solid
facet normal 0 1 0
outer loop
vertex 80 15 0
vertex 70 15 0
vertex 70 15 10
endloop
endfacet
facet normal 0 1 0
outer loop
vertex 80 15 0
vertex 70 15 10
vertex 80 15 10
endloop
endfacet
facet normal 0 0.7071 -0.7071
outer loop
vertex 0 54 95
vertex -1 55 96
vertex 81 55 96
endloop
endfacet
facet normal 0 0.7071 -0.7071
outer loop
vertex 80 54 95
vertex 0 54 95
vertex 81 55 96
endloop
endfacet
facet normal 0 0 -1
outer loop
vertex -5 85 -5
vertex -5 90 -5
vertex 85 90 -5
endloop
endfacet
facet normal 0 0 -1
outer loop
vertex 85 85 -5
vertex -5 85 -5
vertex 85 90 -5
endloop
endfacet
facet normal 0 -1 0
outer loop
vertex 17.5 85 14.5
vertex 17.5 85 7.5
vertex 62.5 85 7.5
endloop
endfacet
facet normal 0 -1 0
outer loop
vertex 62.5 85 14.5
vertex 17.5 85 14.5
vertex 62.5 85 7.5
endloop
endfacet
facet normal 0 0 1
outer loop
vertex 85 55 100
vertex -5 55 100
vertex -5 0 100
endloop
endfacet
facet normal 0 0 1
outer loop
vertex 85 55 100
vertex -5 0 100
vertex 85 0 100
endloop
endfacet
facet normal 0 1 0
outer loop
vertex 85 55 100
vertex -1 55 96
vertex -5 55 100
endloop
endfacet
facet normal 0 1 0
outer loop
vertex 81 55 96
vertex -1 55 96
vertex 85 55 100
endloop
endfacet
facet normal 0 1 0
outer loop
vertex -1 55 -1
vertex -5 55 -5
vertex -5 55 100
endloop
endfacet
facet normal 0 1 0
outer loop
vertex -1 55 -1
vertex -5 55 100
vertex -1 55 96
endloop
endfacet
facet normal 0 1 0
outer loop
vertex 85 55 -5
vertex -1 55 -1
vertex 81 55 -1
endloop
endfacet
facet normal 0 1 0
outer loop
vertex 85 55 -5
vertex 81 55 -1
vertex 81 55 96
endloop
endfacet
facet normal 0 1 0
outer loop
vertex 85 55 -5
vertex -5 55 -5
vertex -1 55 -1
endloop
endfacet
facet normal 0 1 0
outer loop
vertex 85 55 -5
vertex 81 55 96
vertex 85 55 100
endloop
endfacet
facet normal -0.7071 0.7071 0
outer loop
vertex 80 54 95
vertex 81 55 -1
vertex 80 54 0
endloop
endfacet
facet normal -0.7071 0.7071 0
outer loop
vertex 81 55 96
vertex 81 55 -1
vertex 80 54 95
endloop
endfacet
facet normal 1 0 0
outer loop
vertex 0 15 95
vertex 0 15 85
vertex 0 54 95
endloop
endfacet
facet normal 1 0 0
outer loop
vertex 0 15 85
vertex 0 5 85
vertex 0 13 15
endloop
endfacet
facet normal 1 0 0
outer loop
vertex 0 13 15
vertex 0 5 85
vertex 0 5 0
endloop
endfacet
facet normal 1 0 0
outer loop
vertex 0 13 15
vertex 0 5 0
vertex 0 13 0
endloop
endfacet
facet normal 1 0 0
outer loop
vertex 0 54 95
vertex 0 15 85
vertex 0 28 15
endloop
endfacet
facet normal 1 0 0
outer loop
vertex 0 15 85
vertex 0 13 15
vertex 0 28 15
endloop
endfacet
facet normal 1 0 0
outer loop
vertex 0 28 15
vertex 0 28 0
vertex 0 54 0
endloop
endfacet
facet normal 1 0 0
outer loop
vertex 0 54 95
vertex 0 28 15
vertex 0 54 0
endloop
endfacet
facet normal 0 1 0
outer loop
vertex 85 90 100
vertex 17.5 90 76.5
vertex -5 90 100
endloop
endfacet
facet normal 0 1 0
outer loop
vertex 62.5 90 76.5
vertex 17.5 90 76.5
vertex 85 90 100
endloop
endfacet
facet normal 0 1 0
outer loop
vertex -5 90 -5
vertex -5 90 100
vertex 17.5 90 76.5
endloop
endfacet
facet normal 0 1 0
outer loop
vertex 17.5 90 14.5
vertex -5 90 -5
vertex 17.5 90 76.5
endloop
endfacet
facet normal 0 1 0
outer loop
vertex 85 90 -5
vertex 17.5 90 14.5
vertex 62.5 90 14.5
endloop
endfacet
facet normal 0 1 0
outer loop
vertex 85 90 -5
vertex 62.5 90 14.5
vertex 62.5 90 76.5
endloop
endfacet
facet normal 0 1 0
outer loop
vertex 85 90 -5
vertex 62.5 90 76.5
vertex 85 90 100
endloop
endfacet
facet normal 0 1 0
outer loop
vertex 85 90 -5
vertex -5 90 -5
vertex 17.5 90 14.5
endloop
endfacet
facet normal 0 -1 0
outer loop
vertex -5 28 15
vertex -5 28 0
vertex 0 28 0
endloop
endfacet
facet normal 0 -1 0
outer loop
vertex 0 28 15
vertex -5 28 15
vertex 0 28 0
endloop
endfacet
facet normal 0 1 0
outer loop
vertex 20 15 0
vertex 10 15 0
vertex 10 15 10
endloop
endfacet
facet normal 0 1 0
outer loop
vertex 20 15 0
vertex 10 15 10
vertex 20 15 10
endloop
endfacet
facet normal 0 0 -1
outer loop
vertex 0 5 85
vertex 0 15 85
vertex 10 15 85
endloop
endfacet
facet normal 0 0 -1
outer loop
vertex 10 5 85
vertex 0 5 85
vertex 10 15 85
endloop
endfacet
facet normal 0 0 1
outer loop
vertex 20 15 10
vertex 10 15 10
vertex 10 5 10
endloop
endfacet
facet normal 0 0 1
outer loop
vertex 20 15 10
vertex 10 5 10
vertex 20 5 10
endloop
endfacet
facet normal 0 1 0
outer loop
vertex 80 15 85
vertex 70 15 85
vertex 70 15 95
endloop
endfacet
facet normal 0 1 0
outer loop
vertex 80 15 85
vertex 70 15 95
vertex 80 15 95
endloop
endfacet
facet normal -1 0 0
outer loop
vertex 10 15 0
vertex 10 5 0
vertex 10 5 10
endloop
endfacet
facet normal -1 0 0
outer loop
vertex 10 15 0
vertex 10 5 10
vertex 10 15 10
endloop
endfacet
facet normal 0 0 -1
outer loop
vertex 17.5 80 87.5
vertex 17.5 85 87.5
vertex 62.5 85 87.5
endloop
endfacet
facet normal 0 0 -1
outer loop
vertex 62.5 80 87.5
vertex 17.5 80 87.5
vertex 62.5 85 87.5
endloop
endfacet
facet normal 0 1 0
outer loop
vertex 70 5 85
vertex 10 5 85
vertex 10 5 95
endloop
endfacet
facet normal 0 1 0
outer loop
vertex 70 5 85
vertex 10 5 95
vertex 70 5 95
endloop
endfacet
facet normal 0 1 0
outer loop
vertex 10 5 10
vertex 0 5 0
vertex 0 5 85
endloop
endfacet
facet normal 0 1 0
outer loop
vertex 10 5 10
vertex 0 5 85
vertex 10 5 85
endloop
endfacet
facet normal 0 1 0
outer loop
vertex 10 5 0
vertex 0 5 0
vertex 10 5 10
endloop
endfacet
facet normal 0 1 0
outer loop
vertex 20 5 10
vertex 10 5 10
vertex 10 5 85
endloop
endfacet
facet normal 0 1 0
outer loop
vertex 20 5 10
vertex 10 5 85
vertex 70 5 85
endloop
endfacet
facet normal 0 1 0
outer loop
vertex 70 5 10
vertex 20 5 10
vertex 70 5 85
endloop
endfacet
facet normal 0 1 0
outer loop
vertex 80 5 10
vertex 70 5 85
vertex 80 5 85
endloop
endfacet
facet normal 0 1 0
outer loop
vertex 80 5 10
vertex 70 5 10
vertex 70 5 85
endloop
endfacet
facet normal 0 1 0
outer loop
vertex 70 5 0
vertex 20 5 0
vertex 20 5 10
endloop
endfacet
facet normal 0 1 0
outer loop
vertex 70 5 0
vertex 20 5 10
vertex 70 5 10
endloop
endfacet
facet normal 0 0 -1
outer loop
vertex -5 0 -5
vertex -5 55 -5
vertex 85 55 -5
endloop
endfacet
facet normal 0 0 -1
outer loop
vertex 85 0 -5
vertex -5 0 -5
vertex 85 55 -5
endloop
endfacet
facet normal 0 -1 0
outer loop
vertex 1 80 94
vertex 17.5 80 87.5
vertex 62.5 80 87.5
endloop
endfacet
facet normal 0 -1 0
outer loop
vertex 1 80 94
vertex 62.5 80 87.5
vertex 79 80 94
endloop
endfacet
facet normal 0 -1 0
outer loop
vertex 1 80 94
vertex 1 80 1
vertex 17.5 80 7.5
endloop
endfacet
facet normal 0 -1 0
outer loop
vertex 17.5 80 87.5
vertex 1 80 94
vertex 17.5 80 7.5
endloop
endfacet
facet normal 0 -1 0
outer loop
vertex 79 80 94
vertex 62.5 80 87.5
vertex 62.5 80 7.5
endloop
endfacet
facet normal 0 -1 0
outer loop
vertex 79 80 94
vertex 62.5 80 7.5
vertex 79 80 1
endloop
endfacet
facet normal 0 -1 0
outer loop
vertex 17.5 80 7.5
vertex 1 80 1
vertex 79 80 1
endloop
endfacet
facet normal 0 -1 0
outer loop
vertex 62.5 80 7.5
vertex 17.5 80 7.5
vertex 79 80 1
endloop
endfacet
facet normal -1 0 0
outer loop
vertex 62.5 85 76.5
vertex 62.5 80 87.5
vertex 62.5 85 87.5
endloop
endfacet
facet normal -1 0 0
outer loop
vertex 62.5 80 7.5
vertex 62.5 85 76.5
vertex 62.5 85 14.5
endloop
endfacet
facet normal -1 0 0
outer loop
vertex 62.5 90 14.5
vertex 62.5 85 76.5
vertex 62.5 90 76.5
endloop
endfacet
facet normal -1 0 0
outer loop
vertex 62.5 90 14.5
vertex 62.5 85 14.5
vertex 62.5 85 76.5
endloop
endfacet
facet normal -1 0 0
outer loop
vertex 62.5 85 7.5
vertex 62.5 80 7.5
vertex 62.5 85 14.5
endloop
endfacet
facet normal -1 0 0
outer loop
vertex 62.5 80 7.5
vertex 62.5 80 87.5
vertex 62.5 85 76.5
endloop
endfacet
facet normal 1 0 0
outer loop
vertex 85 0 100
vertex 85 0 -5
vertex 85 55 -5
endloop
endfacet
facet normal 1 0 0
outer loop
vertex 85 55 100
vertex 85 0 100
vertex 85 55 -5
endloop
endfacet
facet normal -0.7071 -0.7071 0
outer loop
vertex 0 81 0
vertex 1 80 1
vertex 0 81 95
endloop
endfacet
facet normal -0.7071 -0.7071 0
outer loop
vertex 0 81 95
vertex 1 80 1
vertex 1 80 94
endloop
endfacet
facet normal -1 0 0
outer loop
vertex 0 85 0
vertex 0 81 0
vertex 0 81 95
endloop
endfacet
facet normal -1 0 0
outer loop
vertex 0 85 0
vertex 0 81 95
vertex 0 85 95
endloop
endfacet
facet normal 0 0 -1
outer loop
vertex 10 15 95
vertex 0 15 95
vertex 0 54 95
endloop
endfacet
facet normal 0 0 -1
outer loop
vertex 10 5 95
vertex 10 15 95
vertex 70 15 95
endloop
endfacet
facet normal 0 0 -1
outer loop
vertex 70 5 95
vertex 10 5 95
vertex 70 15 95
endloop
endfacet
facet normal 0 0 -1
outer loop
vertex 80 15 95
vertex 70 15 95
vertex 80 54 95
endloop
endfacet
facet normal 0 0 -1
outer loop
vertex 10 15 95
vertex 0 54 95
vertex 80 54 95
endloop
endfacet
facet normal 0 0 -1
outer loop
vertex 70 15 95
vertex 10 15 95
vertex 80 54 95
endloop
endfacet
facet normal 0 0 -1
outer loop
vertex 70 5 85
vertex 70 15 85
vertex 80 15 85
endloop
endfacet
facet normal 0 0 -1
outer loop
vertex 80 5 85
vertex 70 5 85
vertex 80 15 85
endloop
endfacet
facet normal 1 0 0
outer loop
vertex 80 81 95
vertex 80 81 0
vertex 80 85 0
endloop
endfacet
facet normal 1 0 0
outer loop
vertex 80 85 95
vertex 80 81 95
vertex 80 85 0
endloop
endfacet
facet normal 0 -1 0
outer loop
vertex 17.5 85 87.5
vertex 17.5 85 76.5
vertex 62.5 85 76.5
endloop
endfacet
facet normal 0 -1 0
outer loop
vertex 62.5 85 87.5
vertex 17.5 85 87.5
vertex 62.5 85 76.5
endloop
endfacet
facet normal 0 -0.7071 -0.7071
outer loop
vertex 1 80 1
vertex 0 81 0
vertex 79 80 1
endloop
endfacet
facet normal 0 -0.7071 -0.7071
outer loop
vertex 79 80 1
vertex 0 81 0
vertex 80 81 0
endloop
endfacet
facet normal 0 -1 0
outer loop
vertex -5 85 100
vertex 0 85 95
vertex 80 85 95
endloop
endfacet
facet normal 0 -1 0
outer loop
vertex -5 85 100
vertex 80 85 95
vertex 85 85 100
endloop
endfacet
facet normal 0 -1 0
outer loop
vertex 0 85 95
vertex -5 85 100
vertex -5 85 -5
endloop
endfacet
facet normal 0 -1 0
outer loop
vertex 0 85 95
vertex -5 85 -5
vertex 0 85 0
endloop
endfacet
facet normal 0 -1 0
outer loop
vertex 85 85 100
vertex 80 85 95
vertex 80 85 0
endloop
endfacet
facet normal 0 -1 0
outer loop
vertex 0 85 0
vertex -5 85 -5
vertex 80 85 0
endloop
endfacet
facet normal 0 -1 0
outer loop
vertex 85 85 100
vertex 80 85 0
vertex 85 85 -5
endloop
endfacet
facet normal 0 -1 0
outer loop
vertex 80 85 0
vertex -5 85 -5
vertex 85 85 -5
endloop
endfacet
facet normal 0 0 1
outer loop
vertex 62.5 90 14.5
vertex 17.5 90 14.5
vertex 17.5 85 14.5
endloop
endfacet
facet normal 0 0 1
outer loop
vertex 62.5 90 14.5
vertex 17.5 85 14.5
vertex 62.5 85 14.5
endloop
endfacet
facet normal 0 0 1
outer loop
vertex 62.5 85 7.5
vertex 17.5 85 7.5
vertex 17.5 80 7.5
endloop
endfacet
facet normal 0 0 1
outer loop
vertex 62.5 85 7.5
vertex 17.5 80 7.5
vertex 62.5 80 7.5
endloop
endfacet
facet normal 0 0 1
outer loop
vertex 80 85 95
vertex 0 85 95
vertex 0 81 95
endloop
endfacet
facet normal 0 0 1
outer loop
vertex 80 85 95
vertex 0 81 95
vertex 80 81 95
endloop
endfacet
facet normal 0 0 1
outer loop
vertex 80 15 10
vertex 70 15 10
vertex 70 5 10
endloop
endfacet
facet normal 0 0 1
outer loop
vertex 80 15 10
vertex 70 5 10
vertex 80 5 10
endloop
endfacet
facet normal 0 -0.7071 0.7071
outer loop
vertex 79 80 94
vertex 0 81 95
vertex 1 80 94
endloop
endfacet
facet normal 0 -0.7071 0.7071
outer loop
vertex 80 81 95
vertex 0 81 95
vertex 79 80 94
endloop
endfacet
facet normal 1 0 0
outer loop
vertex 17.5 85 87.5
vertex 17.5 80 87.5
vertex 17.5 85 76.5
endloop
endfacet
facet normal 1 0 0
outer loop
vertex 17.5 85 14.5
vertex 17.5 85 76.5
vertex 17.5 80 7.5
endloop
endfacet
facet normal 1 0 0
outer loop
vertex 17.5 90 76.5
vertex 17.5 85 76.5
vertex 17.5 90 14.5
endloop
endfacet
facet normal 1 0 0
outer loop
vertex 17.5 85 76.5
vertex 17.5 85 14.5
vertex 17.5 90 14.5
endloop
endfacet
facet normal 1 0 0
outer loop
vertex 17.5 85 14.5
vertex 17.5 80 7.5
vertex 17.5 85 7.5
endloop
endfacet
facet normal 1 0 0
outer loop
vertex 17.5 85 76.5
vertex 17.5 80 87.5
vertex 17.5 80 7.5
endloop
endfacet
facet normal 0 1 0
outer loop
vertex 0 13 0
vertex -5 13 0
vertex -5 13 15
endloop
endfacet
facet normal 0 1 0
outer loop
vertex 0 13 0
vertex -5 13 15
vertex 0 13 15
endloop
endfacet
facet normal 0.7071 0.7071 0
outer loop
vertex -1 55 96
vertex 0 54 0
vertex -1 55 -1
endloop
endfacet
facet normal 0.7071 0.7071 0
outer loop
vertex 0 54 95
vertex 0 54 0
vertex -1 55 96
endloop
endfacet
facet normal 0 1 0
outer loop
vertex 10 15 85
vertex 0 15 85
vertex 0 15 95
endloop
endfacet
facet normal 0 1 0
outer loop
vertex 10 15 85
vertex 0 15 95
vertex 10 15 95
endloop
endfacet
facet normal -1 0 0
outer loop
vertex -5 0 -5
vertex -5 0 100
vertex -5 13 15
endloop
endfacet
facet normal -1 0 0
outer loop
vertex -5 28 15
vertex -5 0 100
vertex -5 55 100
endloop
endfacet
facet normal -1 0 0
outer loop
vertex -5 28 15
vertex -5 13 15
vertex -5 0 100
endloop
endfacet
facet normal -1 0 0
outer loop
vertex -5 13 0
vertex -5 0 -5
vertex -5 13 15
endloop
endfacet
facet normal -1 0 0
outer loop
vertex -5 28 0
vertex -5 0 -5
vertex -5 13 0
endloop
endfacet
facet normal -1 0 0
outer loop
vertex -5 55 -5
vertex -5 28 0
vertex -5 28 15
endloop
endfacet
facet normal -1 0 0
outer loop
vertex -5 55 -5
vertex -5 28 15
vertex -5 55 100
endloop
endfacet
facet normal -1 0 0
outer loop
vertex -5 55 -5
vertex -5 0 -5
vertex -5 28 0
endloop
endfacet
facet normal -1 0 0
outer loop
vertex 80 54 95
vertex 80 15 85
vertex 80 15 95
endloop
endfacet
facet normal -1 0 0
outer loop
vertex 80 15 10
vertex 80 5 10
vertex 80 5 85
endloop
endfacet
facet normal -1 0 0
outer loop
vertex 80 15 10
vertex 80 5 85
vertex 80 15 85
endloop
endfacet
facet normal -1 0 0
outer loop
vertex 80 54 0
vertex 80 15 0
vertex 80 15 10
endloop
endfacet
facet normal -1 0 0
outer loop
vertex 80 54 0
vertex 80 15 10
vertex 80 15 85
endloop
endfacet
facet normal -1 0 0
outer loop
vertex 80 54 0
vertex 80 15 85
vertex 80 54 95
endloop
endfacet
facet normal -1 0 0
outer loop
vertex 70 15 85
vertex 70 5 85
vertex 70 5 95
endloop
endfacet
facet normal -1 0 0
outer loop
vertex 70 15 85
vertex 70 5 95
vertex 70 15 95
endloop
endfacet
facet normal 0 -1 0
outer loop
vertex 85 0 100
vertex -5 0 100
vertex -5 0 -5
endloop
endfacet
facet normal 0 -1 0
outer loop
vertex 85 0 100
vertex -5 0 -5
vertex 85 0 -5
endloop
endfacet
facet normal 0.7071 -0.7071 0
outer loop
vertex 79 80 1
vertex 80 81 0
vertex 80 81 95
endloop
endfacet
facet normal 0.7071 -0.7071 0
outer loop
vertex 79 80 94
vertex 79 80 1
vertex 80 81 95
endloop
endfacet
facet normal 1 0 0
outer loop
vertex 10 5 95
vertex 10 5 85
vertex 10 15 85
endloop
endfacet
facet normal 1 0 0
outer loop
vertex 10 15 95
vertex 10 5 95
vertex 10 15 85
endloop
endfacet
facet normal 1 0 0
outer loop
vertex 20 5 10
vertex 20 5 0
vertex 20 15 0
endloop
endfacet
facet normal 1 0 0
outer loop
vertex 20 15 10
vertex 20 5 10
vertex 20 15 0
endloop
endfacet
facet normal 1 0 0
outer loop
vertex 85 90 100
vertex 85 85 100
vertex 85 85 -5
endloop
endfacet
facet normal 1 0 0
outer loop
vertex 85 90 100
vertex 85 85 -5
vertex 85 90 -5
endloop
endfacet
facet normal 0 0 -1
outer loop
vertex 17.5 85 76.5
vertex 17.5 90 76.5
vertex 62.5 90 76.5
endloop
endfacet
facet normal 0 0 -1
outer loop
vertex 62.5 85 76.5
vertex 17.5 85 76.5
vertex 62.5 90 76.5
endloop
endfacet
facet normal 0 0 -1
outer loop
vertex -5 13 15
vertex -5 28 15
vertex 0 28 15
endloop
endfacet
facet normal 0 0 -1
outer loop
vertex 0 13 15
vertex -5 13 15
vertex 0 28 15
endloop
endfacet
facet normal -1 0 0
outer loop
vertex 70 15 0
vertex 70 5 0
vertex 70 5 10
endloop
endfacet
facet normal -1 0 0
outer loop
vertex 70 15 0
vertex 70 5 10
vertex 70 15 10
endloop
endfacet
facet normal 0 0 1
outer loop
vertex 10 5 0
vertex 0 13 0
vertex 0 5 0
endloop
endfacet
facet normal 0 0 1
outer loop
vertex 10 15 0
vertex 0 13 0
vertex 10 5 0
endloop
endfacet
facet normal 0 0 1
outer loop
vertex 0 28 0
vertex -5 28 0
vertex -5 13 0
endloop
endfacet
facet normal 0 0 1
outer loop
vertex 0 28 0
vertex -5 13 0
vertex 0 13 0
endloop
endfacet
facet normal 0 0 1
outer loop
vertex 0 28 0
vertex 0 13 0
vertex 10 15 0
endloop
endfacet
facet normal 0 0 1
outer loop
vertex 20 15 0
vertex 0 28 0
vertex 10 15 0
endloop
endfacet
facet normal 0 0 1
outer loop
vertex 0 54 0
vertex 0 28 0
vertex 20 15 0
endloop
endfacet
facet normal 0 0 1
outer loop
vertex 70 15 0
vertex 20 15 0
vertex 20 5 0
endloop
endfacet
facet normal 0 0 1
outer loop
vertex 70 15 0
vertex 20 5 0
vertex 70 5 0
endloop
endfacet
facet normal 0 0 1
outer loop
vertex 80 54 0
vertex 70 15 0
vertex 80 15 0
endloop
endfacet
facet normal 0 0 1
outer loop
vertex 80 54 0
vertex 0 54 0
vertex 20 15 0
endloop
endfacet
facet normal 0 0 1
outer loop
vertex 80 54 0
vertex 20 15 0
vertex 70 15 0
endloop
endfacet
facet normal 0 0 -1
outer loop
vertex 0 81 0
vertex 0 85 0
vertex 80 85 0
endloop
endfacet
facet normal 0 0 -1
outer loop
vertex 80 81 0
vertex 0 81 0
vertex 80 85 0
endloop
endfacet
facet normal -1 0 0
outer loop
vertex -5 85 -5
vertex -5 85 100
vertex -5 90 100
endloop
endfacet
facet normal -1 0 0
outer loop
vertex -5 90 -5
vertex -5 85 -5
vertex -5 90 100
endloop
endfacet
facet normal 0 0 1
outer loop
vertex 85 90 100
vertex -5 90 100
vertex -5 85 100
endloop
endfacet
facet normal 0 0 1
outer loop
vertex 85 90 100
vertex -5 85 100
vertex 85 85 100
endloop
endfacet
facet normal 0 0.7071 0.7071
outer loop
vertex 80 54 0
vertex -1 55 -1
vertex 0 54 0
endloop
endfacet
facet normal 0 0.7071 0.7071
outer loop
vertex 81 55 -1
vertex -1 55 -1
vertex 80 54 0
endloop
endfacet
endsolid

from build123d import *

# Parameters (mm, degrees)
BOX006_W        = 15
BOX006_H        = 15
BOX006_DEPTH    = 15
BOX003_W        = 10
BOX003_H        = 10
BOX003_DEPTH    = 10
BOX004_W        = 10
BOX004_H        = 10
BOX004_DEPTH    = 10
BOX005_W        = 10
BOX005_H        = 10
BOX005_DEPTH    = 10
BOX002_W        = 10
BOX002_H        = 10
BOX002_DEPTH    = 10
BOX_W           = 80
BOX_H           = 50
BOX_DEPTH       = 95
BOX001_W        = 90
BOX001_H        = 55
BOX001_DEPTH    = 105
CHAMFER_SIZE    = 1
BOX009_W        = 45
BOX009_H        = 5
BOX009_DEPTH    = 80
BOX008_W        = 80
BOX008_H        = 5
BOX008_DEPTH    = 95
BOX010_W        = 45
BOX010_H        = 5
BOX010_DEPTH    = 62
BOX007_W        = 90
BOX007_H        = 5
BOX007_DEPTH    = 105
CHAMFER001_SIZE = 1


with BuildPart() as cube006:
    # Box006 → Box006 (new body)
    with BuildSketch(Plane(origin=(-5, 13, 0), x_dir=(1, 0, 0), z_dir=(0, 0, 1))):
        with Locations((7.5, 7.5)):
            Rectangle(BOX006_W, BOX006_H)
    extrude(amount=BOX006_DEPTH)


with BuildPart() as cube003:
    # Box003 → Box003 (new body)
    with BuildSketch(Plane(origin=(70, 5, 0), x_dir=(1, 0, 0), z_dir=(0, 0, 1))):
        with Locations((5, 5)):
            Rectangle(BOX003_W, BOX003_H)
    extrude(amount=BOX003_DEPTH)


with BuildPart() as cube004:
    # Box004 → Box004 (new body)
    with BuildSketch(Plane(origin=(70, 5, 85), x_dir=(1, 0, 0), z_dir=(0, 0, 1))):
        with Locations((5, 5)):
            Rectangle(BOX004_W, BOX004_H)
    extrude(amount=BOX004_DEPTH)


with BuildPart() as cube005:
    # Box005 → Box005 (new body)
    with BuildSketch(Plane(origin=(0, 5, 85), x_dir=(1, 0, 0), z_dir=(0, 0, 1))):
        with Locations((5, 5)):
            Rectangle(BOX005_W, BOX005_H)
    extrude(amount=BOX005_DEPTH)


with BuildPart() as cube002:
    # Box002 → Box002 (new body)
    with BuildSketch(Plane(origin=(10, 5, 0), x_dir=(1, 0, 0), z_dir=(0, 0, 1))):
        with Locations((5, 5)):
            Rectangle(BOX002_W, BOX002_H)
    extrude(amount=BOX002_DEPTH)


with BuildPart() as cube:
    # Box → Box (new body)
    with BuildSketch(Plane(origin=(0, 5, 0), x_dir=(1, 0, 0), z_dir=(0, 0, 1))):
        with Locations((40, 25)):
            Rectangle(BOX_W, BOX_H)
    extrude(amount=BOX_DEPTH)


with BuildPart() as chamfer_body:
    # Box001 → Box001 (new body)
    with BuildSketch(Plane(origin=(-5, 0, -5), x_dir=(1, 0, 0), z_dir=(0, 0, 1))):
        with Locations((45, 27.5)):
            Rectangle(BOX001_W, BOX001_H)
    extrude(amount=BOX001_DEPTH)

    # Cut: cut Cube
    add(cube.part, mode=Mode.SUBTRACT)

    # Fusion: union Cube002
    add(cube002.part)

    # Fusion001: union Cube003, Cube004, Cube005
    add(cube003.part)
    add(cube004.part)
    add(cube005.part)

    # Cut001: cut Cube006
    add(cube006.part, mode=Mode.SUBTRACT)

    # Chamfer
    chamfer_edges = [chamfer_body.edges().sort_by_distance(p)[0] for p in [
        (40, 55, 95),
        (80, 55, 47.5),
        (40, 55, 0),
        (0, 55, 47.5),
    ]]
    chamfer(chamfer_edges, length=CHAMFER_SIZE)


with BuildPart() as cube009:
    # Box009 → Box009 (new body)
    with BuildSketch(Plane(origin=(17.5, 80, 7.5), x_dir=(1, 0, 0), z_dir=(0, 0, 1))):
        with Locations((22.5, 2.5)):
            Rectangle(BOX009_W, BOX009_H)
    extrude(amount=BOX009_DEPTH)


with BuildPart() as cut002:
    # Box008 → Box008 (new body)
    with BuildSketch(Plane(origin=(0, 80, 0), x_dir=(1, 0, 0), z_dir=(0, 0, 1))):
        with Locations((40, 2.5)):
            Rectangle(BOX008_W, BOX008_H)
    extrude(amount=BOX008_DEPTH)

    # Cut002: cut Cube009
    add(cube009.part, mode=Mode.SUBTRACT)


with BuildPart() as cube010:
    # Box010 → Box010 (new body)
    with BuildSketch(Plane(origin=(17.5, 85, 14.5), x_dir=(1, 0, 0), z_dir=(0, 0, 1))):
        with Locations((22.5, 2.5)):
            Rectangle(BOX010_W, BOX010_H)
    extrude(amount=BOX010_DEPTH)


with BuildPart() as chamfer001:
    # Box007 → Box007 (new body)
    with BuildSketch(Plane(origin=(-5, 85, -5), x_dir=(1, 0, 0), z_dir=(0, 0, 1))):
        with Locations((45, 2.5)):
            Rectangle(BOX007_W, BOX007_H)
    extrude(amount=BOX007_DEPTH)

    # Cut003: cut Cube010
    add(cube010.part, mode=Mode.SUBTRACT)

    # Fusion002: union Cut002
    add(cut002.part)

    # Chamfer001
    chamfer001_edges = [chamfer001.edges().sort_by_distance(p)[0] for p in [
        (40, 80, 95),
        (80, 80, 47.5),
        (40, 80, 0),
        (0, 80, 47.5),
    ]]
    chamfer(chamfer001_edges, length=CHAMFER001_SIZE)


solid = Compound([chamfer_body.part, chamfer001.part])
